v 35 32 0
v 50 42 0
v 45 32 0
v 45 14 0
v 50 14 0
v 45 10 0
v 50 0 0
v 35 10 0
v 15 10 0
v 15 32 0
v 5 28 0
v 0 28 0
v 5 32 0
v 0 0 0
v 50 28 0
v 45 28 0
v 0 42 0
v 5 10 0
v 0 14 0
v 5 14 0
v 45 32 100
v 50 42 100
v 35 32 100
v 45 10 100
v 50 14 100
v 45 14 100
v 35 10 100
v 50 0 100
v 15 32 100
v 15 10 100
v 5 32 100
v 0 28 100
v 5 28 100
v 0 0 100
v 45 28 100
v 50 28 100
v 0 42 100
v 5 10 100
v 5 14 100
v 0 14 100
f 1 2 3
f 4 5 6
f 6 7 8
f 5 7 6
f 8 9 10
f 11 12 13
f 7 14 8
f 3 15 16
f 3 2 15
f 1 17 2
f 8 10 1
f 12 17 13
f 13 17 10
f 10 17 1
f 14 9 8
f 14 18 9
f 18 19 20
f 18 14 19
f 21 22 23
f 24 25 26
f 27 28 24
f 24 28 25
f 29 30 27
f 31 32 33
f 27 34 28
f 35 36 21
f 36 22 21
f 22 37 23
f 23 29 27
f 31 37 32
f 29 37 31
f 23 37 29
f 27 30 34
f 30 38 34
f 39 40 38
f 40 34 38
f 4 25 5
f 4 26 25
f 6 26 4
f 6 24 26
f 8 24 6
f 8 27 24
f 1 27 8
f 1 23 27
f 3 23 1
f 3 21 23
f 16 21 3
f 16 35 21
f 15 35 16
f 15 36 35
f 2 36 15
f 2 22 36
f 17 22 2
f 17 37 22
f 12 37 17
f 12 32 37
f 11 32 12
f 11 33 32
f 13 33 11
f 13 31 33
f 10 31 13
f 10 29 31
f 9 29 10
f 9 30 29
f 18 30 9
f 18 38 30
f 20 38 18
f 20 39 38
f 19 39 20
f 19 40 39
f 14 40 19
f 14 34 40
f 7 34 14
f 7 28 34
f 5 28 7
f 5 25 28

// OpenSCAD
$fn = 32;
// ----------------------------------------------------------------------
// T-slot rail: 50 x 42 mm section, 100 mm long
// ----------------------------------------------------------------------

// --- parameters (mm) ---
profile_height = 100;     // extrusion height
profile_points = 20;      // points of the closed outline

profile = [[0, 0], [50, 0], [50, 14], [45, 14], [45, 10], [35, 10], [35, 32], [45, 32], [45, 28], [50, 28], [50, 42], [0, 42], [0, 28], [5, 28], [5, 32], [15, 32], [15, 10], [5, 10], [5, 14], [0, 14]];  // single closed polygon, 20 points, counter clockwise

// --- the one profile operation ---
linear_extrude(height = profile_height) polygon(points = profile);
